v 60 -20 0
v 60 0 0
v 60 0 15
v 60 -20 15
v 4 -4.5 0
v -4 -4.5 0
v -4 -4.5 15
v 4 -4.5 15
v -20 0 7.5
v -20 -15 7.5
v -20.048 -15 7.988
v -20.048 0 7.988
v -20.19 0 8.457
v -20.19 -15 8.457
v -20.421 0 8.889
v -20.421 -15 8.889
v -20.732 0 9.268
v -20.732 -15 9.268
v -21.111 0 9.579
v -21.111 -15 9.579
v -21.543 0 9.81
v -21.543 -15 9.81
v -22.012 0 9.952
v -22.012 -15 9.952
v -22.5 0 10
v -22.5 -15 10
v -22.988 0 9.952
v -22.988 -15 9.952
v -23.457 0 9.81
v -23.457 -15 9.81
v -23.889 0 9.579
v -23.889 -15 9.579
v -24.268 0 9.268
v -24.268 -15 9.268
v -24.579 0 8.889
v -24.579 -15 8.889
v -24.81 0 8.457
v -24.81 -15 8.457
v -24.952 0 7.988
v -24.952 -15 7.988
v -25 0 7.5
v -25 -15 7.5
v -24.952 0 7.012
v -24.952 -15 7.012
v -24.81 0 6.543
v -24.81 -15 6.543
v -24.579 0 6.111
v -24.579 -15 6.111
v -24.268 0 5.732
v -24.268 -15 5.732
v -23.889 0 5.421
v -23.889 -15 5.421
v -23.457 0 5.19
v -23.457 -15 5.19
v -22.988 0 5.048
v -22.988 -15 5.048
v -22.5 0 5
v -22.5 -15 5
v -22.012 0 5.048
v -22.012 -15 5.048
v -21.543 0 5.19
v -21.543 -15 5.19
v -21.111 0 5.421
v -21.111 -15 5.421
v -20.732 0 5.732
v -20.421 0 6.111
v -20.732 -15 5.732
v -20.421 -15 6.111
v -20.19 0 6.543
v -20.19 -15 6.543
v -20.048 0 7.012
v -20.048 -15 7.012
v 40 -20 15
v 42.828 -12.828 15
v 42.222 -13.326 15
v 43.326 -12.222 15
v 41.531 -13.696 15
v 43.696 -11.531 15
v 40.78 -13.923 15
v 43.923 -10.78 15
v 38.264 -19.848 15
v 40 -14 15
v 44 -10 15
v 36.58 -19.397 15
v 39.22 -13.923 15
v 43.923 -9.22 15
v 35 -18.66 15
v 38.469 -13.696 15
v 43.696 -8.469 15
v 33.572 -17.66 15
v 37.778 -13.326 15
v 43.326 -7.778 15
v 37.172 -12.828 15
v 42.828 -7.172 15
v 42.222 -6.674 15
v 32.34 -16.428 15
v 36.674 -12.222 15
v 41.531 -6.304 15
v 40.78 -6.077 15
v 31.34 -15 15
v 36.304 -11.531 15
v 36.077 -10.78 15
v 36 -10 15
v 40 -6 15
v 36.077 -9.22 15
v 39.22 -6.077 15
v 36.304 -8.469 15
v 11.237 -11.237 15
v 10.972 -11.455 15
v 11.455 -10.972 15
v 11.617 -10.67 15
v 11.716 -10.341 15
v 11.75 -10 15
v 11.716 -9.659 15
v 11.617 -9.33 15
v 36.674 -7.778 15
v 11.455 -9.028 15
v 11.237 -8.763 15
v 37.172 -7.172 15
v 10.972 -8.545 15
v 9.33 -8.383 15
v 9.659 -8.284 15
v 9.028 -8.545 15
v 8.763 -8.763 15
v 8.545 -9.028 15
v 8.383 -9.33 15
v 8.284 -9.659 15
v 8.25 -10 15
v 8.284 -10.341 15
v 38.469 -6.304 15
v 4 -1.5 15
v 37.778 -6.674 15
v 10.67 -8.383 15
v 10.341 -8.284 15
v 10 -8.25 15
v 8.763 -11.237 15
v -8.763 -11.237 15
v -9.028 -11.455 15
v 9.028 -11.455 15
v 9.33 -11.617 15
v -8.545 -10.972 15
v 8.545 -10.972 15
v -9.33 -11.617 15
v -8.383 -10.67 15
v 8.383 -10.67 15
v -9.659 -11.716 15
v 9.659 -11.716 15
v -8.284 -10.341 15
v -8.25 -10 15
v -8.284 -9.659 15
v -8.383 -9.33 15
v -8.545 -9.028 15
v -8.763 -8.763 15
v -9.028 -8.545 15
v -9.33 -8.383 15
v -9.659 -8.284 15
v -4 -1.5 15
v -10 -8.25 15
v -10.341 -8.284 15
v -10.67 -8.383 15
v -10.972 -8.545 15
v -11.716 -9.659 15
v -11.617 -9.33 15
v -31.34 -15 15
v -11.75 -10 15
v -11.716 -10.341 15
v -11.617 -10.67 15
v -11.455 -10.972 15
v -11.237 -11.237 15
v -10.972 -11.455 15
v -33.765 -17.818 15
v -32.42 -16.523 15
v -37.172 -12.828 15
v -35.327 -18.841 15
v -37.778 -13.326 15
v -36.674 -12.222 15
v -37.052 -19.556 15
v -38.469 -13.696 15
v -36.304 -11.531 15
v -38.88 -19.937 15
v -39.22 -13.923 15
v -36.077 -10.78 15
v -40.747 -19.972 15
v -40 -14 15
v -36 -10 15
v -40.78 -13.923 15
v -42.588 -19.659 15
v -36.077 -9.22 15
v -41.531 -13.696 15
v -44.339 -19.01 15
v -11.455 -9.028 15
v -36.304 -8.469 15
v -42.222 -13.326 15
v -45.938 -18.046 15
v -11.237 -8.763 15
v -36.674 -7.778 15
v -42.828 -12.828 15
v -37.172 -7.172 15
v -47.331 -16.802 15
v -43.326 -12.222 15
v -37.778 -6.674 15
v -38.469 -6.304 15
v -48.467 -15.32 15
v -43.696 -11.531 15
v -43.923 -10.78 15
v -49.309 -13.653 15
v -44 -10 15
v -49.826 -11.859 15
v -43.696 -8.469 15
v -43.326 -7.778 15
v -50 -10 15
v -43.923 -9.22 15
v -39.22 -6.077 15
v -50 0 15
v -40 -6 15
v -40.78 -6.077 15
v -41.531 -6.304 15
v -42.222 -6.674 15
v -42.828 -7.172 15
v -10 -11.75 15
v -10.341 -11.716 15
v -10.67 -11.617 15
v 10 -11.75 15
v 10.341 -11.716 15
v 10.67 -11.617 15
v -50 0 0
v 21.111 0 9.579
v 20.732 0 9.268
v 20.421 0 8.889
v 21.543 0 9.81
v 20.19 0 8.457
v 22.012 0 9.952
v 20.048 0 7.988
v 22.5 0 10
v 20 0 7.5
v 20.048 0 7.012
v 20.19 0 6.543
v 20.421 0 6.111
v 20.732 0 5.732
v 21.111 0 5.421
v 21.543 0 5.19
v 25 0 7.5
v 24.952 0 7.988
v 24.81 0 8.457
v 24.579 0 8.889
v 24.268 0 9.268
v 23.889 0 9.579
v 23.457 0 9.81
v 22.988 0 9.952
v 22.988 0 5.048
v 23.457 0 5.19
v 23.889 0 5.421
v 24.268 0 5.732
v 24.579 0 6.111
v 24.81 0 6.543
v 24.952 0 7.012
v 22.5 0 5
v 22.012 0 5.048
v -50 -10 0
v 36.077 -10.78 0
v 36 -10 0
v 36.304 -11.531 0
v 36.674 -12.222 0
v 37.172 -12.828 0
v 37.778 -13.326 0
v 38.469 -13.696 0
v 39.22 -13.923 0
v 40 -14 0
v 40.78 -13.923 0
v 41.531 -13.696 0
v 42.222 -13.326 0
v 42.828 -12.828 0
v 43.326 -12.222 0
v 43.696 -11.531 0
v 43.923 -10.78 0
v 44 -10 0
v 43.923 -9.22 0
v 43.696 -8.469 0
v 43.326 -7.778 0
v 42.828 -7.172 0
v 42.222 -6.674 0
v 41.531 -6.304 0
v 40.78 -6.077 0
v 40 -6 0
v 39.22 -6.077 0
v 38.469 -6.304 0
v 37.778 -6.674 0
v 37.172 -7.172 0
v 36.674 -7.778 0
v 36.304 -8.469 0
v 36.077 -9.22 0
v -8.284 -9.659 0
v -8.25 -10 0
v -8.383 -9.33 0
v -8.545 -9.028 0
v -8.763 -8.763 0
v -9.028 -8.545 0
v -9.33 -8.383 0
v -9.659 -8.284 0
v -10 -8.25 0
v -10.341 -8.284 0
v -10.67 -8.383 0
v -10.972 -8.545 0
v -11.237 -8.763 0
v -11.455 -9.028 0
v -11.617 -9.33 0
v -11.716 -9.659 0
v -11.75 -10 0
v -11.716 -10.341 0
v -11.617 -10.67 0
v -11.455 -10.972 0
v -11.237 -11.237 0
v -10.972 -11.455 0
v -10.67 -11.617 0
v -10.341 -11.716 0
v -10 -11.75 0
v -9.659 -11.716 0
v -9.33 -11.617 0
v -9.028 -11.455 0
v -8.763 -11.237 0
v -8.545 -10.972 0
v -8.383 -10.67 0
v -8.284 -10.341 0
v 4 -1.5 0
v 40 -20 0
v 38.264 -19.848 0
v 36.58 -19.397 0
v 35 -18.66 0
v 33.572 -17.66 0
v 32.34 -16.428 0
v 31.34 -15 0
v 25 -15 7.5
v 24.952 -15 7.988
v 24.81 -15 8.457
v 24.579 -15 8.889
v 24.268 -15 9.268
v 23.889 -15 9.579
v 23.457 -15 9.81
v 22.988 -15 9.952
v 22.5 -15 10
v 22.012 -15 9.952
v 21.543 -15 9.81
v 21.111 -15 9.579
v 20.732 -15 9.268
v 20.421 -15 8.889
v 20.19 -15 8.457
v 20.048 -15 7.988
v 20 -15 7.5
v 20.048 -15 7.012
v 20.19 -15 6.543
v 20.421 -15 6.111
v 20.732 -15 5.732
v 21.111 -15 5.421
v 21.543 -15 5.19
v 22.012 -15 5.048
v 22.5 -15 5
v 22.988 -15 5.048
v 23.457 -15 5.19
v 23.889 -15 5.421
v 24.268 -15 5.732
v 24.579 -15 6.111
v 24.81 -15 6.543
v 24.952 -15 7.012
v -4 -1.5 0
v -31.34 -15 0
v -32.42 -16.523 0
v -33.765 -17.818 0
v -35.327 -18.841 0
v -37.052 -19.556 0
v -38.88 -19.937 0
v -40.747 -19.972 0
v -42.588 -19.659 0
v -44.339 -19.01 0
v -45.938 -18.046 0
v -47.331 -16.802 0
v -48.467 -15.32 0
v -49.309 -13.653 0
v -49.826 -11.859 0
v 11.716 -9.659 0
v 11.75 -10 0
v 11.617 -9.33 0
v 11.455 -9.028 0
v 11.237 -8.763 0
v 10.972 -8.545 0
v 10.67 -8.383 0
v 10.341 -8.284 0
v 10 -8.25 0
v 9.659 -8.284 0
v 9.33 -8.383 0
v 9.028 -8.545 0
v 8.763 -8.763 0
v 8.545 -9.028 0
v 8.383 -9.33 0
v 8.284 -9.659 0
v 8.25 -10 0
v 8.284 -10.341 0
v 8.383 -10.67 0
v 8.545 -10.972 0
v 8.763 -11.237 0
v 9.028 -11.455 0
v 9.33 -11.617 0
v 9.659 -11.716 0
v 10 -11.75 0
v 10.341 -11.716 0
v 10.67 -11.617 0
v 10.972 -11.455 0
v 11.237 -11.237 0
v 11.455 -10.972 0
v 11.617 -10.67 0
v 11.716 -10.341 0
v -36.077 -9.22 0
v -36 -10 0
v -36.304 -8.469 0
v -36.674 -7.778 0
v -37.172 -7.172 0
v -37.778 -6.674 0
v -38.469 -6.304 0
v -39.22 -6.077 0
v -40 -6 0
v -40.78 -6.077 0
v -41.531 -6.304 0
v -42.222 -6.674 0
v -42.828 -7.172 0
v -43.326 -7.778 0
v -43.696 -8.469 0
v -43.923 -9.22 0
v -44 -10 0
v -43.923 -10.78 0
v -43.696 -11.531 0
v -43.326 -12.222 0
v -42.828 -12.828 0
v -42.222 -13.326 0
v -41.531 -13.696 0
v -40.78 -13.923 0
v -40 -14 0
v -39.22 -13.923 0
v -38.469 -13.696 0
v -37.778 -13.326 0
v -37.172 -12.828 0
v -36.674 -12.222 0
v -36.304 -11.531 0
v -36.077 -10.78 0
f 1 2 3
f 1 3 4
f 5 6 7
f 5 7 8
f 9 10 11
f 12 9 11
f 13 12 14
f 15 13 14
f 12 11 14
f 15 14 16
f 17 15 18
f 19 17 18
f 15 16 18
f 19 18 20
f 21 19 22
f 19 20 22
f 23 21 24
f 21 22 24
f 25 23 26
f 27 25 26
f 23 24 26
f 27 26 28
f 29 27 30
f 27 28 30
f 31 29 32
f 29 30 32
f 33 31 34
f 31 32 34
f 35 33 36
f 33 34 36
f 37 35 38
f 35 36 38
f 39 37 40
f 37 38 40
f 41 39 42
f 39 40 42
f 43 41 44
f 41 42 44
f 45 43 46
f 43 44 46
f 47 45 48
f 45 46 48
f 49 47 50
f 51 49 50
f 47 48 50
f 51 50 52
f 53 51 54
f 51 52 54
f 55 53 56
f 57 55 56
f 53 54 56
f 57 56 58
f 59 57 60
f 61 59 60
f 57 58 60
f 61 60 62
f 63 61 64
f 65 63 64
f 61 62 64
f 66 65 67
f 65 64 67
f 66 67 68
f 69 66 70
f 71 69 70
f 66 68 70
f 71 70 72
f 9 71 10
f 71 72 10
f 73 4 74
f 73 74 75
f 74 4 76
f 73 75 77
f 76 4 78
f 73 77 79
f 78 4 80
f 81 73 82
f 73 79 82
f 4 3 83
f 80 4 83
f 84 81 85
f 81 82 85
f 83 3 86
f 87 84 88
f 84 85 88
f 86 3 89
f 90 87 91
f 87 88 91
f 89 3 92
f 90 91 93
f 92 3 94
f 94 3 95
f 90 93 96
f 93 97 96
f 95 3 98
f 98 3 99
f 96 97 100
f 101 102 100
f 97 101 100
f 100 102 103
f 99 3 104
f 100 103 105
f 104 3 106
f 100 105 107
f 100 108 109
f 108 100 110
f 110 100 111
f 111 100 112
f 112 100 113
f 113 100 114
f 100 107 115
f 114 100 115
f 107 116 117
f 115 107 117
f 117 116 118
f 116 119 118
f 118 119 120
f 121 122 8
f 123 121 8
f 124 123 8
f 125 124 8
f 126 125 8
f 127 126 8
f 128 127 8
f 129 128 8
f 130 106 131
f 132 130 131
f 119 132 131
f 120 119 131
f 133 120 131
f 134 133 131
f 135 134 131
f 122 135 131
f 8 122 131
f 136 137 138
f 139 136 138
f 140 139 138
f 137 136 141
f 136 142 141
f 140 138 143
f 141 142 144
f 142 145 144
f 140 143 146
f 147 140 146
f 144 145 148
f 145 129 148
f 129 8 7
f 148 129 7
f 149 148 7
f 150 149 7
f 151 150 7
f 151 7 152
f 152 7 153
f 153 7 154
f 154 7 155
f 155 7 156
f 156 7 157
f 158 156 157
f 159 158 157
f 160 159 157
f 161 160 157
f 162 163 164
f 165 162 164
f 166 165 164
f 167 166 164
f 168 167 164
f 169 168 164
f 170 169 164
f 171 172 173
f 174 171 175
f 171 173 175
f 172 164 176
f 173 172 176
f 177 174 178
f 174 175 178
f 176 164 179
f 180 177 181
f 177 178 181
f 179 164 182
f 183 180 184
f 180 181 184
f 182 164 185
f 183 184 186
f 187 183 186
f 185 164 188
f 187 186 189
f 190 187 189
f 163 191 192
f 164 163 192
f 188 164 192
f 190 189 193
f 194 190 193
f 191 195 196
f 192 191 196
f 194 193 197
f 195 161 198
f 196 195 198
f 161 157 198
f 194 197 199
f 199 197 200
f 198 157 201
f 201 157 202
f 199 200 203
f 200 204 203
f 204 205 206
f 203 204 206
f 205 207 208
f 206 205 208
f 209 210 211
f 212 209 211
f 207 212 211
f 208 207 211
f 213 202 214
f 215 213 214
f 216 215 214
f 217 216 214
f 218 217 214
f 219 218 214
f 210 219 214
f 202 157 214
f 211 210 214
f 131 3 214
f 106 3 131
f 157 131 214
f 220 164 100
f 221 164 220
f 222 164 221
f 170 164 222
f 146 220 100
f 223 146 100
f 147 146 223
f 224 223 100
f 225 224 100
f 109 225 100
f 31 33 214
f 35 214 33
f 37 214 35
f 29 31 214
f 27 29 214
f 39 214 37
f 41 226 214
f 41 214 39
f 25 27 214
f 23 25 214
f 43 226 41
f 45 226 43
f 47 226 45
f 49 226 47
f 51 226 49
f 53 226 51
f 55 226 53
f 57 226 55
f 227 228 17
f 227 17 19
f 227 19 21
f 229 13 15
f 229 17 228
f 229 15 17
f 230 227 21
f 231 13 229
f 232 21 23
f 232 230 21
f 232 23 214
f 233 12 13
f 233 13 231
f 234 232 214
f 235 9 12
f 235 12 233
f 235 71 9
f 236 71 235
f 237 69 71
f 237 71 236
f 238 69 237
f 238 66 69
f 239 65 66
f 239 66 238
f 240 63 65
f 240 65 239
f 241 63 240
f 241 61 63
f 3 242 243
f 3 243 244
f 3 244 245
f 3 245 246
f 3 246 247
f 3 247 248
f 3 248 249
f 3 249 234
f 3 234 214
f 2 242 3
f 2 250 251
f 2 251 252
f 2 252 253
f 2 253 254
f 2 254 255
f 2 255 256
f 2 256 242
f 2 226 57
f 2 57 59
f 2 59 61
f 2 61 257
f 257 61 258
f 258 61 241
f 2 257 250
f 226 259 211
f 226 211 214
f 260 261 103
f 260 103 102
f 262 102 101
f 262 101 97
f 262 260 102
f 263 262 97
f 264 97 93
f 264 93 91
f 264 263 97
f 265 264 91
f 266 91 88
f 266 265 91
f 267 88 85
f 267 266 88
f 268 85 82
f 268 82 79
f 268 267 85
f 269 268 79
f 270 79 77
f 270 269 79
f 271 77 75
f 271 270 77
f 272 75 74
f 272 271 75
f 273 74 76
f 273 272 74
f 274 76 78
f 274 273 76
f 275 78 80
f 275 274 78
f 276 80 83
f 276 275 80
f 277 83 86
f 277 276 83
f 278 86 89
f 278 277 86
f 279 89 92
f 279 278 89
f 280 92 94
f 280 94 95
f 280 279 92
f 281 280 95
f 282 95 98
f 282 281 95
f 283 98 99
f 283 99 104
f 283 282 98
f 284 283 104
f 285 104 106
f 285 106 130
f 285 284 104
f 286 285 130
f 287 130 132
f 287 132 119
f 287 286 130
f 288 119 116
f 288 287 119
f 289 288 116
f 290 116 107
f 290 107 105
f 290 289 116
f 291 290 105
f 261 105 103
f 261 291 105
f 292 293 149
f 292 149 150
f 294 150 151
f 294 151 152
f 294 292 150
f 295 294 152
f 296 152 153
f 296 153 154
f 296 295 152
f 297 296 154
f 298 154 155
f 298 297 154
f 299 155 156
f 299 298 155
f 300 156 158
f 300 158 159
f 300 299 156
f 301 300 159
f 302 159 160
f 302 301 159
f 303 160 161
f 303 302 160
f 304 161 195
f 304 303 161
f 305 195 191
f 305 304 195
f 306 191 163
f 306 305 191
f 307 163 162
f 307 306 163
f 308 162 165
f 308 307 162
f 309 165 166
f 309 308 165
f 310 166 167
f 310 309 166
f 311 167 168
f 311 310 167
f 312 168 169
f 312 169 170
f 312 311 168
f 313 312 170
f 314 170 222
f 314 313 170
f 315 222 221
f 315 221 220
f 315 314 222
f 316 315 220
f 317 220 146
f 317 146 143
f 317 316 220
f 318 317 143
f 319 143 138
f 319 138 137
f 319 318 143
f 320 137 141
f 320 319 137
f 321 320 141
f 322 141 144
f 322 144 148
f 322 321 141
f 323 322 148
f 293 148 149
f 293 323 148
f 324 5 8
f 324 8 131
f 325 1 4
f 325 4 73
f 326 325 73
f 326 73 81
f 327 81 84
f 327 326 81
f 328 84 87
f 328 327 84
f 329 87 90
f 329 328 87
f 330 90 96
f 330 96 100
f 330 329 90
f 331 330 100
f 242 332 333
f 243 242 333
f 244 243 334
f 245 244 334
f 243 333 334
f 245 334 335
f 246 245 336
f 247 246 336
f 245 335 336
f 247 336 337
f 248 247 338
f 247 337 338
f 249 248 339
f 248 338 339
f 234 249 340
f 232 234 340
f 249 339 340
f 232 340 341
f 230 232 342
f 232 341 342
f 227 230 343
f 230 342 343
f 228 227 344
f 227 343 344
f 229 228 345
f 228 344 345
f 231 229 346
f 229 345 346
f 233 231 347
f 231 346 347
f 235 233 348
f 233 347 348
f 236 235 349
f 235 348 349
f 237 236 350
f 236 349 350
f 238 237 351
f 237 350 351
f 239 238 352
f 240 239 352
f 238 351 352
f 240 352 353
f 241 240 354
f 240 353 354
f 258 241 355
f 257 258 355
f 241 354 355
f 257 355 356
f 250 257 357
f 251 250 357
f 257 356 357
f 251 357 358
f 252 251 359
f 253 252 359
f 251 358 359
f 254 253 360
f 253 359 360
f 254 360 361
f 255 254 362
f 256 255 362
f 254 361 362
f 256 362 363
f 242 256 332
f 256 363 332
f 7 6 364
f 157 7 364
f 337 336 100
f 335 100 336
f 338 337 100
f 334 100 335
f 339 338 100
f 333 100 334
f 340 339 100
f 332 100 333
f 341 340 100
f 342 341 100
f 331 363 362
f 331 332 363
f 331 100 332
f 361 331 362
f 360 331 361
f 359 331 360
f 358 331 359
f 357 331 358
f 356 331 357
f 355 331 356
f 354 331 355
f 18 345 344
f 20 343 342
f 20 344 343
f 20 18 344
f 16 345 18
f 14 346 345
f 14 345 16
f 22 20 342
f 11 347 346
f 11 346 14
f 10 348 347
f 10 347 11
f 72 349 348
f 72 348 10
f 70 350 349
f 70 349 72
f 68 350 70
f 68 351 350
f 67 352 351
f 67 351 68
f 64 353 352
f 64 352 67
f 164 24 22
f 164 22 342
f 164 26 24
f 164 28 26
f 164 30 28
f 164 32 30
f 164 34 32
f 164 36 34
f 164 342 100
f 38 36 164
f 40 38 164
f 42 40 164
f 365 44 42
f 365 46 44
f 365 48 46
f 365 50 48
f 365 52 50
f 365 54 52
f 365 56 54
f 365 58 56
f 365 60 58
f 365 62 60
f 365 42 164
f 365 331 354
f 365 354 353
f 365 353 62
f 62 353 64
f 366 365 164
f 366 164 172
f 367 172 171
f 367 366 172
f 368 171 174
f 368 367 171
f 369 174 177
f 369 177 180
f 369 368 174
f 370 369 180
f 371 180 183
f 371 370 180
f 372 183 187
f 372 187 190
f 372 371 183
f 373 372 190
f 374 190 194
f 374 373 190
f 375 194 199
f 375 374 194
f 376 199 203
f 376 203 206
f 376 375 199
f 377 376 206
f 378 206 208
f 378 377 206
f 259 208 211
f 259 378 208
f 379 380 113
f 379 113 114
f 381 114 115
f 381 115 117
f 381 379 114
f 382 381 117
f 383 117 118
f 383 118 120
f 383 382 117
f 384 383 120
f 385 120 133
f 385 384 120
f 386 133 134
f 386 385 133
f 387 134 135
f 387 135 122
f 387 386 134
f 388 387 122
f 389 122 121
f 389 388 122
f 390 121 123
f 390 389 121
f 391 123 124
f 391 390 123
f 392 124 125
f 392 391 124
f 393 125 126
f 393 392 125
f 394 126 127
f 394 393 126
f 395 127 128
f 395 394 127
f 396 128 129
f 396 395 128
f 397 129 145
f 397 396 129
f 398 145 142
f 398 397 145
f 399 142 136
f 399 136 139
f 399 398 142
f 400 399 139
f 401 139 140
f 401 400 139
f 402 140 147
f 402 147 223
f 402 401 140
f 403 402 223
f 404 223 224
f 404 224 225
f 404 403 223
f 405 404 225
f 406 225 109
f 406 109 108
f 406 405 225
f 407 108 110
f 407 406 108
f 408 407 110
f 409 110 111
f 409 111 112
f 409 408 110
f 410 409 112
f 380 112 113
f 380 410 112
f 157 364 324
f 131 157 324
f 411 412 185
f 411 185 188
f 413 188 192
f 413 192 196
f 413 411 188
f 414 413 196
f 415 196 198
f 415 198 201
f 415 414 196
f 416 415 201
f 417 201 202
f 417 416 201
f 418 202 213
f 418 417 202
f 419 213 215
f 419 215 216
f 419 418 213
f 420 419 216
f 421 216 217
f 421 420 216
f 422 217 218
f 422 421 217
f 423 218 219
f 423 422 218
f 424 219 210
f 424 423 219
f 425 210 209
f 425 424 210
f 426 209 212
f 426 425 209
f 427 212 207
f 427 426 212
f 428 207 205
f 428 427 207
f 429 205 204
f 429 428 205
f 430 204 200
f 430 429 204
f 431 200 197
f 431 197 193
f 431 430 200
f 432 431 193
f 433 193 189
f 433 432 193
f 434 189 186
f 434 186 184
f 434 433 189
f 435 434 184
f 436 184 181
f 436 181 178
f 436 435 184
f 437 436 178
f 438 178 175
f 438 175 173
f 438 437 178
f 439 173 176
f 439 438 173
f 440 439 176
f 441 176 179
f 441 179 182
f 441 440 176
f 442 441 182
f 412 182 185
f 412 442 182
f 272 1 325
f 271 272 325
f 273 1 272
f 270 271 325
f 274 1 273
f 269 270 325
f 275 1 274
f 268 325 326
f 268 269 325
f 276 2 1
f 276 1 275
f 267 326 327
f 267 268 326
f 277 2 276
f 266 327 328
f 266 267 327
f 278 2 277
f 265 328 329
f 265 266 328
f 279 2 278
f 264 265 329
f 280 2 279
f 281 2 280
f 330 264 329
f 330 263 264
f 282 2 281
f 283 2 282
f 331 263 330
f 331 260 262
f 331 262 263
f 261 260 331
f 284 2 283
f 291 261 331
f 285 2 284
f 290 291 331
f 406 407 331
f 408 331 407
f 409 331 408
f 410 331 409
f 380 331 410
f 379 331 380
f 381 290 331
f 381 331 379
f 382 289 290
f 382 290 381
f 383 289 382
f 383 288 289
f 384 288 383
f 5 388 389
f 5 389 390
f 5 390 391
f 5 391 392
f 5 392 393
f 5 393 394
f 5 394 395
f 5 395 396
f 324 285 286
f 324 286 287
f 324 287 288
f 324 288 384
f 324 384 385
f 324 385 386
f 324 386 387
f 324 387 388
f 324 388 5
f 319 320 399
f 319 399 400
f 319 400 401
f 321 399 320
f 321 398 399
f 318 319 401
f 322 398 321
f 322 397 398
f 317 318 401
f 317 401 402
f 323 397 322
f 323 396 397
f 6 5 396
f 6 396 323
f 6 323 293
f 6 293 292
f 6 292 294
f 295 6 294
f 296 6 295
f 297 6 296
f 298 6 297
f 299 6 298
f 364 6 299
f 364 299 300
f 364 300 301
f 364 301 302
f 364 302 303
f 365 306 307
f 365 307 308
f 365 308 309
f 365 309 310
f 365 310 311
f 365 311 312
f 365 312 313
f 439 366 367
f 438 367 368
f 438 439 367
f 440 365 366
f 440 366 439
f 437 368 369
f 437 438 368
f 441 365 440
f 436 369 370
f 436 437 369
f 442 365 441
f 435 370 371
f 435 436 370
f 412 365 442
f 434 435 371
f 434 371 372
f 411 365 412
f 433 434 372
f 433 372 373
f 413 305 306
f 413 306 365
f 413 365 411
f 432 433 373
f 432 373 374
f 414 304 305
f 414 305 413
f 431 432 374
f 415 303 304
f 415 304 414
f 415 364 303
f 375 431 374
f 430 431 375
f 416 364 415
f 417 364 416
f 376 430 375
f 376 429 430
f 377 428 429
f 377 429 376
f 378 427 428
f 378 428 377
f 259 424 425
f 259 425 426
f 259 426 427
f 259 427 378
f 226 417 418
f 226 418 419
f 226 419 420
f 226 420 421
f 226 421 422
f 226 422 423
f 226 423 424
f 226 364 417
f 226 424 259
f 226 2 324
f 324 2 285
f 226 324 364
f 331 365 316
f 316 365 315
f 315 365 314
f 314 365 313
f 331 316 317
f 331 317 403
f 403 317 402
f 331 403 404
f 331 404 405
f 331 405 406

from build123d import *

# Parameters (mm, degrees)
ESBO_O1_R                = 4
ESBO_O1_R_2              = 1.75
ESBO_O1_W                = 8
ESBO_O1_H                = 3
RESSALTO_EXTRUS_O1_DEPTH = 15
ESBO_O2_R                = 2.5
CORTE_EXTRUS_O1_DEPTH    = 15


with BuildPart() as part:
    # Esboço1 → Ressalto-extrusão1 (new body)
    with BuildSketch(Plane.XY):
        with BuildLine():
            Line((-50, -10), (-50, 0))
            Line((-50, 0), (50, 0))
            Line((50, 0), (60, 0))
            Line((60, 0), (60, -20))
            Line((60, -20), (40, -20))
            ThreePointArc((40, -20), (35, -18.660254038), (31.339745962, -15))
            Line((31.339745962, -15), (-31.339745962, -15))
            ThreePointArc((-31.339745962, -15), (-42.588190451, -19.659258263), (-50, -10))
        make_face()
        with Locations((-40, -10)):
            Circle(ESBO_O1_R, mode=Mode.SUBTRACT)
        with Locations(Location((40, -10, 0), (0, 0, 180))):
            Circle(ESBO_O1_R, mode=Mode.SUBTRACT)
        with Locations((10, -10)):
            Circle(ESBO_O1_R_2, mode=Mode.SUBTRACT)
        with Locations((-10, -10)):
            Circle(ESBO_O1_R_2, mode=Mode.SUBTRACT)
        with Locations((0, -3)):
            Rectangle(ESBO_O1_W, ESBO_O1_H, mode=Mode.SUBTRACT)
    extrude(amount=RESSALTO_EXTRUS_O1_DEPTH)

    # Esboço2 → Corte-extrusão1 (cut)
    with BuildSketch(Plane.XZ.offset(15)):
        with Locations((22.5, 7.5)):
            Circle(ESBO_O2_R)
        with Locations((-22.5, 7.5)):
            Circle(ESBO_O2_R)
    extrude(amount=-CORTE_EXTRUS_O1_DEPTH, mode=Mode.SUBTRACT)


solid = part.part
